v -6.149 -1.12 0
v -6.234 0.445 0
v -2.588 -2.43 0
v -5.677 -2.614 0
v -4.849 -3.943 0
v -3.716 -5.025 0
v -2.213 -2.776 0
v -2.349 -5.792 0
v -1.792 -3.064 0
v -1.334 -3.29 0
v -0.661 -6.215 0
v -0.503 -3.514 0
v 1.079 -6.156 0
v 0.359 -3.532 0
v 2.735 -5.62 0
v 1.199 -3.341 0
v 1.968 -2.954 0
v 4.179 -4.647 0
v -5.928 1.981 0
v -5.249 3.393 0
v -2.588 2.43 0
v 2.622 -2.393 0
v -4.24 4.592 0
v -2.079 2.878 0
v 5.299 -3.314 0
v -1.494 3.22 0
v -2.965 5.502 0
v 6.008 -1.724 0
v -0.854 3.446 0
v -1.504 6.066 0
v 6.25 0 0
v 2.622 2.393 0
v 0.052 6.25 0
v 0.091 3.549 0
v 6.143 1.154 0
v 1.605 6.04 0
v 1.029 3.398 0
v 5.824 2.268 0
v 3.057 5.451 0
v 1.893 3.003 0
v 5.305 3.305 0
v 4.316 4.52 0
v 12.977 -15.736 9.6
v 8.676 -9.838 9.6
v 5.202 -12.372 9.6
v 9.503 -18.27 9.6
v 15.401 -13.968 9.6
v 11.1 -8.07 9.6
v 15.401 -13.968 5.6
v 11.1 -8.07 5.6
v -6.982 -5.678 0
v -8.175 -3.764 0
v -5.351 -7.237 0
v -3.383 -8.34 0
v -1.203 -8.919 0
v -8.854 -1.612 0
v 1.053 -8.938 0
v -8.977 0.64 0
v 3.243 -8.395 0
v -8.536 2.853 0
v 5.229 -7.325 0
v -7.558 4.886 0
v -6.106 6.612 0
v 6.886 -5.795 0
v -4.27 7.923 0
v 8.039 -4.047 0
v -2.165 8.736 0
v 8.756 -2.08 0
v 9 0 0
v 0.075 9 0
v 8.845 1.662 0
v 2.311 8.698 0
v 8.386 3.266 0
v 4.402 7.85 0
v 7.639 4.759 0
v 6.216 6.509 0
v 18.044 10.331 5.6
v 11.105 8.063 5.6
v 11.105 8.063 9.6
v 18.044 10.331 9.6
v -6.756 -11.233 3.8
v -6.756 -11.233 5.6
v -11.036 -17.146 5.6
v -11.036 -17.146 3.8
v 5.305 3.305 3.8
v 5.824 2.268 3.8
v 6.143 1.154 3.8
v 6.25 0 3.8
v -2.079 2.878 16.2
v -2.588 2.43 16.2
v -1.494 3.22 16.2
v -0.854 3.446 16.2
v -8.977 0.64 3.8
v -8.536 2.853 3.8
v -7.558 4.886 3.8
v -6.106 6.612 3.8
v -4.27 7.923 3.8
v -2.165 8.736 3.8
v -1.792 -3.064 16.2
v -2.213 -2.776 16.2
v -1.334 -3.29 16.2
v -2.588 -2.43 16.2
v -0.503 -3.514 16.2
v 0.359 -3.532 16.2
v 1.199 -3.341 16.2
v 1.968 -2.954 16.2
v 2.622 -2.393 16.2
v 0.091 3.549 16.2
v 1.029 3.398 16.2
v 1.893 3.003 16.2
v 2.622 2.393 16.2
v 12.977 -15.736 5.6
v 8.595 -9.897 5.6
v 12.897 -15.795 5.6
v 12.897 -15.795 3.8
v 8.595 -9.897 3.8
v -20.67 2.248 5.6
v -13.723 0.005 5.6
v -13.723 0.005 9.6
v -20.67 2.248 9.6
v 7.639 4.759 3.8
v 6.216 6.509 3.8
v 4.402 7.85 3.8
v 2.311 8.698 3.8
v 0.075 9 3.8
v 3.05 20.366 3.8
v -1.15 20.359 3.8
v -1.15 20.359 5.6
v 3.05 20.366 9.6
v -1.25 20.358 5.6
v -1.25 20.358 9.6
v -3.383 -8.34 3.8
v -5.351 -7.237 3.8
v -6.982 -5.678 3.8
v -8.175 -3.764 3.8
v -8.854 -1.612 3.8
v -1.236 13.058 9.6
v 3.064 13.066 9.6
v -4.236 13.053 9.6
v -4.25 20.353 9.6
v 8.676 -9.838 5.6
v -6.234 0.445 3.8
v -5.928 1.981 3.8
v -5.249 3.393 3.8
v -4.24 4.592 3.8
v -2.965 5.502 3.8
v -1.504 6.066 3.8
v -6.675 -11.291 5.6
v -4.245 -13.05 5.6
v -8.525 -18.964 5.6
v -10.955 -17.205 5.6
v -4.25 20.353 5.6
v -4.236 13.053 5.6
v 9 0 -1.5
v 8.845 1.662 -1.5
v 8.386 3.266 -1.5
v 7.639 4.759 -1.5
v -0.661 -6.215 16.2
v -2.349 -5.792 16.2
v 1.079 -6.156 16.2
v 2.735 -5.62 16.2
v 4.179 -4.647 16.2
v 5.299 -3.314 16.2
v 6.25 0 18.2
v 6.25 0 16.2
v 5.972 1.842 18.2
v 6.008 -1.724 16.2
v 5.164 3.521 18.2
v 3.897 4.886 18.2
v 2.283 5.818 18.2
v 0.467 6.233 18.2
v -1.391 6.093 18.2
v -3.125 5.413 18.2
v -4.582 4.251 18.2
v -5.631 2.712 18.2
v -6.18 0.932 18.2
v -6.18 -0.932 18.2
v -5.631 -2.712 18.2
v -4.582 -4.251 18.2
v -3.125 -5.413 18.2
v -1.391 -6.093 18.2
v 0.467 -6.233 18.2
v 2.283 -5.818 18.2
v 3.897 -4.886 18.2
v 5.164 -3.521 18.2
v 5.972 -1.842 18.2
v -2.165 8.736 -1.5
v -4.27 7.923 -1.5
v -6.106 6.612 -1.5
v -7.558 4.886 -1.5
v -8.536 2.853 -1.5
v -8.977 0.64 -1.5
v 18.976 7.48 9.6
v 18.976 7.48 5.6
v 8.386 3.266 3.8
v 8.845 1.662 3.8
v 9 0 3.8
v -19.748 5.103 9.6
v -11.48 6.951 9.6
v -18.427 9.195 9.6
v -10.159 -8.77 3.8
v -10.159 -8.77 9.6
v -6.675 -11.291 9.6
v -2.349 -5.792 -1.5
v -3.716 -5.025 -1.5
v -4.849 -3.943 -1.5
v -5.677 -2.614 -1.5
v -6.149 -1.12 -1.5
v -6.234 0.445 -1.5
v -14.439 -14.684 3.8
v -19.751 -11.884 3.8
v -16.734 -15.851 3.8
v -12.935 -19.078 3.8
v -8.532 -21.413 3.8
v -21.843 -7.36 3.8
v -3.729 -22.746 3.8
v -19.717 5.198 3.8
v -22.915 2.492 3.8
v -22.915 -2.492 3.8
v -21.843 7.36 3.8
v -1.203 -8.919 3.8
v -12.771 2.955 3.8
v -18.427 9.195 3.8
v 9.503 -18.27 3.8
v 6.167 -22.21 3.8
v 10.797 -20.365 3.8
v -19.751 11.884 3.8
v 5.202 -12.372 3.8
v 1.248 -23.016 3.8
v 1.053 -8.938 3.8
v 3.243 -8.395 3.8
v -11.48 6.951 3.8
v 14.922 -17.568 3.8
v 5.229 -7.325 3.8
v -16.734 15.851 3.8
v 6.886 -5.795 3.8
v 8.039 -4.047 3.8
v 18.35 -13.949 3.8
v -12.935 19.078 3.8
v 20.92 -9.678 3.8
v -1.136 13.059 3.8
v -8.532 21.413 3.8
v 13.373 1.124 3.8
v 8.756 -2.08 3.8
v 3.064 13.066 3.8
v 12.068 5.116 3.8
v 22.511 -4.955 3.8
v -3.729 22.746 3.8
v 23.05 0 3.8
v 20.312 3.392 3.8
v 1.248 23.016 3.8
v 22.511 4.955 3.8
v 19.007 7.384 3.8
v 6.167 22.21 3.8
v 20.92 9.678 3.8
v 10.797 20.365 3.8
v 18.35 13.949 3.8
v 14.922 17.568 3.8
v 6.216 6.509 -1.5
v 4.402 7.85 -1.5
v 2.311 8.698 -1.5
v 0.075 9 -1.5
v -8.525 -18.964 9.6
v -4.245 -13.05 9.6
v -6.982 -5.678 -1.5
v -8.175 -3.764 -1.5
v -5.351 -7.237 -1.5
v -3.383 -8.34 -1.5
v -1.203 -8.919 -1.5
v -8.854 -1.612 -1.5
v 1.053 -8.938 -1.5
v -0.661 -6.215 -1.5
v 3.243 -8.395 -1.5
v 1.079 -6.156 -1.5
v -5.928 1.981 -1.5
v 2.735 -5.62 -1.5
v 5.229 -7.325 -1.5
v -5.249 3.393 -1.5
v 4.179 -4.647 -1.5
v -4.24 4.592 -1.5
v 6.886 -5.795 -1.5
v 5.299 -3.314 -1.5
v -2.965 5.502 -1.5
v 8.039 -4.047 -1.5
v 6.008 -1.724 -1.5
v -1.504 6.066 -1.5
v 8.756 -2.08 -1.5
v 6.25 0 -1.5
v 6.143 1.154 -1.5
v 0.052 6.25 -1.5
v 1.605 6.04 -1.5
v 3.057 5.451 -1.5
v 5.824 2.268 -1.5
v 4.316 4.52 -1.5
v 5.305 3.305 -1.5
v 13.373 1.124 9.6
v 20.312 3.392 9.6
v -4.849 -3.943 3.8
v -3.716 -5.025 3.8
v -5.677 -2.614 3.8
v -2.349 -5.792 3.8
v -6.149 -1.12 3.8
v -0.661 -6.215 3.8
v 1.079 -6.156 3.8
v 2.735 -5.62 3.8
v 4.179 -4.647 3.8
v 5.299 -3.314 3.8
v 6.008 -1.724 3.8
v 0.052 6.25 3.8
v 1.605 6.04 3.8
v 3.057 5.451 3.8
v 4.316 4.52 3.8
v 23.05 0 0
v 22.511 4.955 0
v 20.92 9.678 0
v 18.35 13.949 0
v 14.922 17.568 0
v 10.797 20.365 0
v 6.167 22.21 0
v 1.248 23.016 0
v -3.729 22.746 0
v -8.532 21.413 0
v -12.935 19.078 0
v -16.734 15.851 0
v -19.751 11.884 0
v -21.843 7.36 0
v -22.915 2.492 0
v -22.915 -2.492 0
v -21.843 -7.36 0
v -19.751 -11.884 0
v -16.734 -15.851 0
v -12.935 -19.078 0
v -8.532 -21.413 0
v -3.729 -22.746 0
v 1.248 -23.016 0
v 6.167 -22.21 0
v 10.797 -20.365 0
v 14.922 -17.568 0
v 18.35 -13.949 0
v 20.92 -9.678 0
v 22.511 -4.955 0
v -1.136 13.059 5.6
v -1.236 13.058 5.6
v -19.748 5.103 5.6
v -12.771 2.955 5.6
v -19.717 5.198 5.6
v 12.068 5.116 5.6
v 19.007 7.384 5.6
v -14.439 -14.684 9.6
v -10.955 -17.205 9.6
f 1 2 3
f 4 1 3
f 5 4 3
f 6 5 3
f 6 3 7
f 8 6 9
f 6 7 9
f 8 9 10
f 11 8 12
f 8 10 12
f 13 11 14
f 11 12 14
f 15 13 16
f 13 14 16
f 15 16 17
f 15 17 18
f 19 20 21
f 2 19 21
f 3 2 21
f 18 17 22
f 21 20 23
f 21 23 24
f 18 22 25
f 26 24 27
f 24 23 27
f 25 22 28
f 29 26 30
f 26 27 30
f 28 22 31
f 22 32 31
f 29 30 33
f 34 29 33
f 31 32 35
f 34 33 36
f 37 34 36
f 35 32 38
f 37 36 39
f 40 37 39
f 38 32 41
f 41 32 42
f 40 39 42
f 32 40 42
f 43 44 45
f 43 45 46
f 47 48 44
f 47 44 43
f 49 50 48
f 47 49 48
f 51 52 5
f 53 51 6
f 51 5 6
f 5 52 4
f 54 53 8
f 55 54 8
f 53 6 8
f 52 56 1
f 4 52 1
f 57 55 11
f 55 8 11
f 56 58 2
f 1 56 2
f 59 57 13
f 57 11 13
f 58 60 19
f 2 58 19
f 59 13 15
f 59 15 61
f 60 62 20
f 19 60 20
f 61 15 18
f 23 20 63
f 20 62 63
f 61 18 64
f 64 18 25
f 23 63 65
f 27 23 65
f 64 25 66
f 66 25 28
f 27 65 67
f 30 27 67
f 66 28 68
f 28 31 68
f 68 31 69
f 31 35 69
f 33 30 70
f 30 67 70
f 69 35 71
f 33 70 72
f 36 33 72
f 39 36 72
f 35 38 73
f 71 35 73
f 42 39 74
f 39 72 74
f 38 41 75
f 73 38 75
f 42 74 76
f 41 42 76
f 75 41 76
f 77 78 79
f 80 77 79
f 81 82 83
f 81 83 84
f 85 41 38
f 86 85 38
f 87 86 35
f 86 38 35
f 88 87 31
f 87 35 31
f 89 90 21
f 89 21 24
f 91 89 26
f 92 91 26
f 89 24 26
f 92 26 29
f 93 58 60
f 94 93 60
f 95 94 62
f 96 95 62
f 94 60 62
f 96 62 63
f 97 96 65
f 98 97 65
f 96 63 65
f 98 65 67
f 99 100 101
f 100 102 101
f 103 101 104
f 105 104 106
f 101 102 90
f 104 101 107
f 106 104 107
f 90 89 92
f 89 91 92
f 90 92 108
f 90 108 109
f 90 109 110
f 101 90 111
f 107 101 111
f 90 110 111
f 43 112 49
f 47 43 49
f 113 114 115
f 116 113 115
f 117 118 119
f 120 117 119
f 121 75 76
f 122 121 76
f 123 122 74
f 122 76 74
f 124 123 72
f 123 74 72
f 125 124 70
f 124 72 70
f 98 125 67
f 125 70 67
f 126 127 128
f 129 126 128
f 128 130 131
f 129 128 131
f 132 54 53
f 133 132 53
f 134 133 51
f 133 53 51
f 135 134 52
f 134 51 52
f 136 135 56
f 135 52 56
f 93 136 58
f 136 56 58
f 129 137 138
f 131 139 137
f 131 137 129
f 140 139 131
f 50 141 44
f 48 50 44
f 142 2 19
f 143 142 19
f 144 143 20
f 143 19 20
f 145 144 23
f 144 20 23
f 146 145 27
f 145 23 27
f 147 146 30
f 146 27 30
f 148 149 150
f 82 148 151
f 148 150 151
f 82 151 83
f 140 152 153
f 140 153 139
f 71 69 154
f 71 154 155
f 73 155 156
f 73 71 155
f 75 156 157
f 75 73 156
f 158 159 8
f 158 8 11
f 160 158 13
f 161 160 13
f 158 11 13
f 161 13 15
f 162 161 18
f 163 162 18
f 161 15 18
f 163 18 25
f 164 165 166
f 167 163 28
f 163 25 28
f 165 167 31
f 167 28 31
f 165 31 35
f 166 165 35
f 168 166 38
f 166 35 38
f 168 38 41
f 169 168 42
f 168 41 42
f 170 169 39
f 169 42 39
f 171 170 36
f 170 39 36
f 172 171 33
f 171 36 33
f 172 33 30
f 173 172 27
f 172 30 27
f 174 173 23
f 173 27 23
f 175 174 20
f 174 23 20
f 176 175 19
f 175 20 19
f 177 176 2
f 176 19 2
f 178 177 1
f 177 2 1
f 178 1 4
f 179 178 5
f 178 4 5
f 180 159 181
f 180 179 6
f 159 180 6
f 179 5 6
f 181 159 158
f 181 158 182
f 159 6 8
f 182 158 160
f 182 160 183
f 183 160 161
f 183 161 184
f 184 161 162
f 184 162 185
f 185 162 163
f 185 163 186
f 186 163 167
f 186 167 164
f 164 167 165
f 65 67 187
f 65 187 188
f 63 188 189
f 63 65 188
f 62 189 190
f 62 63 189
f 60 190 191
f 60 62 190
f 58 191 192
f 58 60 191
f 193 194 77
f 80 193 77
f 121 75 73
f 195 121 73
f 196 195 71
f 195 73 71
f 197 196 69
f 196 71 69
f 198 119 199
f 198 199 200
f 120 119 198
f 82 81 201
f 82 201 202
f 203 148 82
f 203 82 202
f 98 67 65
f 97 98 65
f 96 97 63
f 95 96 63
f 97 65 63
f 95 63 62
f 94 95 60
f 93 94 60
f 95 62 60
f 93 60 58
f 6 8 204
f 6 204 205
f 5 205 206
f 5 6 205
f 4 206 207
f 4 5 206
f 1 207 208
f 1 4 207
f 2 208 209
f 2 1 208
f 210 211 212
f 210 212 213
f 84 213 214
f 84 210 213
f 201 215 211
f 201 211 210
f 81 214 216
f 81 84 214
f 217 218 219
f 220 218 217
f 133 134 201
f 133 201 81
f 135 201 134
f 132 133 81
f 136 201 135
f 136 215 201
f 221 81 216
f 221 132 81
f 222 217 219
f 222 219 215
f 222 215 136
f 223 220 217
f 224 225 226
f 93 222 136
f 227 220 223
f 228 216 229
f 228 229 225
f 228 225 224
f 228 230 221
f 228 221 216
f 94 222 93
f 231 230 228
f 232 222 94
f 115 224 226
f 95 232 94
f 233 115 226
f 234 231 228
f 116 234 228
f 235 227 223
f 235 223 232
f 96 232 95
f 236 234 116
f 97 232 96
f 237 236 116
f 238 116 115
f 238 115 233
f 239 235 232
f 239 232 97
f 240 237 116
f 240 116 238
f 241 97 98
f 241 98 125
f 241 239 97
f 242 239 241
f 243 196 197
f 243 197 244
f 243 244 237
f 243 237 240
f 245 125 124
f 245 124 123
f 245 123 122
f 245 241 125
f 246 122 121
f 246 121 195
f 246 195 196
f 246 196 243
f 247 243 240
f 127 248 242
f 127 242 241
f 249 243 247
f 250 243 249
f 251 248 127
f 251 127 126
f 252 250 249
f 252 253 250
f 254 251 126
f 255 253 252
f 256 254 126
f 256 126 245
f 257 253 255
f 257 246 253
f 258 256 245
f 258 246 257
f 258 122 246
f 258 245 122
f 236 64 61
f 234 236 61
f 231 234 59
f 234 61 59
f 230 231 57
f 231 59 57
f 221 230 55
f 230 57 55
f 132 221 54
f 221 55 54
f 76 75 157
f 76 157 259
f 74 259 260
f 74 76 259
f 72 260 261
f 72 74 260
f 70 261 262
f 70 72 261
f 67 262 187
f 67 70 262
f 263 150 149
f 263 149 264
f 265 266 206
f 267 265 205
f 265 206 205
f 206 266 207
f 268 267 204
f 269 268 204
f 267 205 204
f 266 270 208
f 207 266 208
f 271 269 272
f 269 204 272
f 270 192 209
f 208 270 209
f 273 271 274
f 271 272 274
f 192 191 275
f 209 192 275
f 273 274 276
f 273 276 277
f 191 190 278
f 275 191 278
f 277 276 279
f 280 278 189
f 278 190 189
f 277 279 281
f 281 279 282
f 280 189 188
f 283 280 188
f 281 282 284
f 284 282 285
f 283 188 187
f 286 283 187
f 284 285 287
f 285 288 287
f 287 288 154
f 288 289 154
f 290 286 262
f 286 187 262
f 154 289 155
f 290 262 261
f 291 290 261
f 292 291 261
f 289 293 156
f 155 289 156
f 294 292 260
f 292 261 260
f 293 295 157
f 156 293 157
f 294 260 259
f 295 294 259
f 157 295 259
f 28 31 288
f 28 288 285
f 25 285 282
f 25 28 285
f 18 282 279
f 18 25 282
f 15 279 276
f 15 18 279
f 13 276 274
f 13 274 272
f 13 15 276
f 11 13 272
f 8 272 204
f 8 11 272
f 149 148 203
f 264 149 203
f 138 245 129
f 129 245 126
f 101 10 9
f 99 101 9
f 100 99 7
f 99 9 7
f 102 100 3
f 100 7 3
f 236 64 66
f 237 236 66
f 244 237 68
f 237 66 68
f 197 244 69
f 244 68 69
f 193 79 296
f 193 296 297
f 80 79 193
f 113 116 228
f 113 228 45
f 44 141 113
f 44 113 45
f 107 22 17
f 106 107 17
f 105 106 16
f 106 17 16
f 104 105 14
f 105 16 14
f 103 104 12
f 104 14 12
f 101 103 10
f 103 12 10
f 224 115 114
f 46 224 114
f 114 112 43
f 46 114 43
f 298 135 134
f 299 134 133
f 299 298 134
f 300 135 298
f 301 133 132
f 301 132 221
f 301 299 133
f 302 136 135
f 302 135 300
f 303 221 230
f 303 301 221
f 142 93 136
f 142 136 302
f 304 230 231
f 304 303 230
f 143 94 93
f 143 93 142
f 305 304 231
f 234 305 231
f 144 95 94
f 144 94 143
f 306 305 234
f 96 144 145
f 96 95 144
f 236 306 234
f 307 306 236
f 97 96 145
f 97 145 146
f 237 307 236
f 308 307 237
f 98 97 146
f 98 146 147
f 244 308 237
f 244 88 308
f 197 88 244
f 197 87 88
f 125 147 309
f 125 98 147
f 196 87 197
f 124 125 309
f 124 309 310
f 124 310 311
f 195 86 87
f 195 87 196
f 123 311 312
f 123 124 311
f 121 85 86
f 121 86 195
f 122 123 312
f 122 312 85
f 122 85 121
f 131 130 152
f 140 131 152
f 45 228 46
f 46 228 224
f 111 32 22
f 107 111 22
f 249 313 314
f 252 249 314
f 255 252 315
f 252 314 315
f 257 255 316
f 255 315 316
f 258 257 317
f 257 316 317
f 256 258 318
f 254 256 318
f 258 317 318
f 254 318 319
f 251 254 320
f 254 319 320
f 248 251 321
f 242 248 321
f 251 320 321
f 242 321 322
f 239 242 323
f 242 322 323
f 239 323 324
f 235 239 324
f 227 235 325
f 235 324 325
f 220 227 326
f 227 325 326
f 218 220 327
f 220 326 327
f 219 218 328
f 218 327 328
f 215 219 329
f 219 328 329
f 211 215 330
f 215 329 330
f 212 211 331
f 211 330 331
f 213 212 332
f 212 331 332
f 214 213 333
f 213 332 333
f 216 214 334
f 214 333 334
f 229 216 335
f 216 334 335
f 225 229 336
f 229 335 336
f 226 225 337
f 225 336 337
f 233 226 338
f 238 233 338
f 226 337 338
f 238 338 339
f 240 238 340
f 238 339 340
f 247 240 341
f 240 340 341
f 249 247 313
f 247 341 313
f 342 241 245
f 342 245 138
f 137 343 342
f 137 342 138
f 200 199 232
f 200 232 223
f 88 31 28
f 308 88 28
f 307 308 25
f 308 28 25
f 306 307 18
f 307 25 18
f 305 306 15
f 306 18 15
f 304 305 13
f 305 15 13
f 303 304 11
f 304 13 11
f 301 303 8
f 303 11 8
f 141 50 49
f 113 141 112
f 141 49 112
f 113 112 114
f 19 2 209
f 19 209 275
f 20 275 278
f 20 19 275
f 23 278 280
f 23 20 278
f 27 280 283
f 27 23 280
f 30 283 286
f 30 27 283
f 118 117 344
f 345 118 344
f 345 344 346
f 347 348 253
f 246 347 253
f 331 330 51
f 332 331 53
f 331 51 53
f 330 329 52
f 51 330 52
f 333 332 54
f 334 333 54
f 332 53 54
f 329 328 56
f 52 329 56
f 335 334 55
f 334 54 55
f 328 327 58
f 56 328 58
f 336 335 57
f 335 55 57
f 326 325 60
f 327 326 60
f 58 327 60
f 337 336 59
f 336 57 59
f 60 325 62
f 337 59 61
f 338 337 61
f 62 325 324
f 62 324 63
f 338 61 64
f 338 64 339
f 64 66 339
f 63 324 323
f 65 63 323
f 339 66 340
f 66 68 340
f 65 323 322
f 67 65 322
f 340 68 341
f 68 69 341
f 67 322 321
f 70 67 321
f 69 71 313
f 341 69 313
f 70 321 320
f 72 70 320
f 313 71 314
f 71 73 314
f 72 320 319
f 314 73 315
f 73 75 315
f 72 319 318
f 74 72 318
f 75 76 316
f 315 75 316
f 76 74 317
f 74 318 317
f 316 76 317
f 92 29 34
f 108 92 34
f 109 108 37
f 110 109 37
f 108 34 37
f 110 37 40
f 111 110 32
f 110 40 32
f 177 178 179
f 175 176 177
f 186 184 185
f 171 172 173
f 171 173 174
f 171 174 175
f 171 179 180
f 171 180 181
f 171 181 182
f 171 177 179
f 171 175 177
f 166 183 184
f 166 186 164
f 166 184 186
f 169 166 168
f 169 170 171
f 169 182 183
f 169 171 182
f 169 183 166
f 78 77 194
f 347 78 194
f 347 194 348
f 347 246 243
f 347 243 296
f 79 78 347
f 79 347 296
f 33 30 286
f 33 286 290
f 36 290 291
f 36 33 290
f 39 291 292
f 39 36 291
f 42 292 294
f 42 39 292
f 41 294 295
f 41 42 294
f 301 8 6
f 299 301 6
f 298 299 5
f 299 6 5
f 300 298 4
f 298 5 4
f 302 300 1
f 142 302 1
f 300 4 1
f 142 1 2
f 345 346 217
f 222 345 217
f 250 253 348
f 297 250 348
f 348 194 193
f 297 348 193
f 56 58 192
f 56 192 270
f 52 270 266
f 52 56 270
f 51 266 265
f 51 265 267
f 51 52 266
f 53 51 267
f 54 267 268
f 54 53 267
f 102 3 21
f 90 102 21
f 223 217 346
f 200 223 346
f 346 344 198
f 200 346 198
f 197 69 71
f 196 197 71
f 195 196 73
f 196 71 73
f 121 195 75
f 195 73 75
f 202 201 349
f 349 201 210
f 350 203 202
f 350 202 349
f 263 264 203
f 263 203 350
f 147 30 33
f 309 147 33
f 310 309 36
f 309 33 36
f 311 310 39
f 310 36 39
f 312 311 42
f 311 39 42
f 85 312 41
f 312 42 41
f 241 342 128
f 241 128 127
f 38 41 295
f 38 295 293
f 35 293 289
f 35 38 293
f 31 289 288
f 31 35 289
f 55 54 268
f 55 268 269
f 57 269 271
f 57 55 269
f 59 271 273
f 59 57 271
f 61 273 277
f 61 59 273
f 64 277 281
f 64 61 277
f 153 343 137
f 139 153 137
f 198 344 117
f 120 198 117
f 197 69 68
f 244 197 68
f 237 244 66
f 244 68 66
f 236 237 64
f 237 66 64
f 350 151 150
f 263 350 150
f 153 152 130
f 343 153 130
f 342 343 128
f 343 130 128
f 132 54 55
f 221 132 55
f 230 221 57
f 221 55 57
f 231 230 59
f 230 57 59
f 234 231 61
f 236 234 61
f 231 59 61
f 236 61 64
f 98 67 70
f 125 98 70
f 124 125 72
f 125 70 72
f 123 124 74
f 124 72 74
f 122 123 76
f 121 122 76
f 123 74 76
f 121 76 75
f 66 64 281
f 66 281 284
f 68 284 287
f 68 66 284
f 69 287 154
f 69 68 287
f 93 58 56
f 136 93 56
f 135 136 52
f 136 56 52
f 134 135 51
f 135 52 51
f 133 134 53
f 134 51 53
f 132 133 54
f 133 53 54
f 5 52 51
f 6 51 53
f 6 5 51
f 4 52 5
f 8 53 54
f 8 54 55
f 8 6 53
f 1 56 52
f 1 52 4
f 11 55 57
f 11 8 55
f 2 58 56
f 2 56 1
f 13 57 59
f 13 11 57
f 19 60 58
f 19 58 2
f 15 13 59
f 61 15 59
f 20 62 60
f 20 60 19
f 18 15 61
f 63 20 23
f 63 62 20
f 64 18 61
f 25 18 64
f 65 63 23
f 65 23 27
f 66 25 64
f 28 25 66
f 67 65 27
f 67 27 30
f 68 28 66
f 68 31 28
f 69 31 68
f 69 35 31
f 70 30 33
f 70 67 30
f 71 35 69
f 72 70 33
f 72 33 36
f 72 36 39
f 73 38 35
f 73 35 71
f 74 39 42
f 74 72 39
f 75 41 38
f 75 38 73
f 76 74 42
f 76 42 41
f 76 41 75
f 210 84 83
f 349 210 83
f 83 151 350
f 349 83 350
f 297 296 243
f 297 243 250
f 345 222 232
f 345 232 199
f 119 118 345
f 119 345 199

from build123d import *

# Parameters (mm, degrees)
F1_DEPTH  = 16.2
F0_R      = 23.05
F2_DEPTH  = 3.8
F3_DEPTH  = 1.5
F4_DEPTH  = 3.8
F5_R      = 6.25
F6_DEPTH  = 2
F7_DEPTH  = 9.6
F8_W      = 1.6
F8_H      = 5.8
F9_DEPTH  = 5.4
F8_W_2    = 7.3
F10_DEPTH = 4.3
F12_DEPTH = 7.3
F11_W     = 2.4
F11_H     = 4
F13_DEPTH = 7.3
F14_W     = 1.6
F14_H     = 5.8
F15_DEPTH = 5.4
F16_DEPTH = 4.3
F17_W     = 2.4
F17_H     = 4
F18_DEPTH = 7.3
F19_W     = 1.6
F19_H     = 5.8
F20_DEPTH = 5.4
F19_W_2   = 7.3
F21_DEPTH = 4.3
F22_W     = 2.4
F22_H     = 4
F23_DEPTH = 7.3
F24_W     = 1.6
F24_H     = 5.8
F25_DEPTH = 5.4
F26_DEPTH = 4.3
F27_W     = 2.4
F27_H     = 4
F28_DEPTH = 7.3
F29_W     = 1.6
F29_H     = 5.8
F30_DEPTH = 5.4
F31_DEPTH = 4.3
F32_W     = 2.4
F32_H     = 4
F33_DEPTH = 7.3


with BuildPart() as f1:
    # F0 (on Top) → F1 (new body)
    with BuildSketch(Plane.XY):
        with BuildLine():
            Line((2.62206635, 1.633340396), (5.3049401224, 3.3045590171))
            ThreePointArc((5.3049401224, 3.3045590171), (2.3494156576, 5.791609972), (-1.5035057347, 6.0664627672))
            Line((-1.5035057347, 6.0664627672), (-0.8539912573, 3.4457508518))
            ThreePointArc((-0.8539912573, 3.4457508518), (1.0288359447, 3.3976457436), (2.62206635, 2.3931711297))
            Line((2.62206635, 2.3931711297), (2.62206635, 1.633340396))
        make_face()
        with BuildLine():
            Line((-0.8539912573, 3.4457508518), (-1.5035057347, 6.0664627672))
            ThreePointArc((-1.5035057347, 6.0664627672), (-4.7821390387, 4.0241329768), (-6.2341577688, 0.4447211645))
            Line((-6.2341577688, 0.4447211645), (-2.5880055924, 0.1846185008))
            Line((-2.5880055924, 0.1846185008), (-2.5880055924, 2.4299644141))
            ThreePointArc((-2.5880055924, 2.4299644141), (-1.7943776359, 3.0631207779), (-0.8539912573, 3.4457508518))
        make_face()
        with BuildLine():
            ThreePointArc((-6.2341577688, 0.4447211645), (-5.3049401224, -3.3045590171), (-2.3494156576, -5.791609972))
            Line((-2.3494156576, -5.791609972), (-1.3344680935, -3.2896344641))
            ThreePointArc((-1.3344680935, -3.2896344641), (-2.0077868669, -2.9276768772), (-2.5880055924, -2.4299644141))
            Line((-2.5880055924, -2.4299644141), (-2.5880055924, 0.1846185008))
            Line((-2.5880055924, 0.1846185008), (-6.2341577688, 0.4447211645))
        make_face()
        with BuildLine():
            ThreePointArc((-2.3494156576, -5.791609972), (1.5035057347, -6.0664627672), (4.7821390387, -4.0241329768))
            Line((4.7821390387, -4.0241329768), (2.62206635, -2.206448533))
            Line((2.62206635, -2.206448533), (2.62206635, -2.3931711297))
            ThreePointArc((2.62206635, -2.3931711297), (0.7844673002, -3.4622407564), (-1.3344680935, -3.2896344641))
            Line((-1.3344680935, -3.2896344641), (-2.3494156576, -5.791609972))
        make_face()
        with BuildLine():
            ThreePointArc((4.7821390387, -4.0241329768), (5.8715785353, -2.1417435664), (6.25, 0))
            ThreePointArc((6.25, 0), (6.0090921014, 1.7185203279), (5.3049401224, 3.3045590171))
            Line((5.3049401224, 3.3045590171), (2.62206635, 1.633340396))
            Line((2.62206635, 1.633340396), (2.62206635, -2.206448533))
            Line((2.62206635, -2.206448533), (4.7821390387, -4.0241329768))
        make_face()
    extrude(amount=F1_DEPTH)

    # F5 (on face) → F6 (join)
    with BuildSketch(Plane.XY.offset(16.2)):
        Circle(F5_R)
        with BuildLine():
            ThreePointArc((2.62206635, -2.3931711297), (0.0250693088, -3.549911482), (-2.5880055924, -2.4299644141))
            Line((-2.5880055924, -2.4299644141), (-2.5880055924, 2.4299644141))
            ThreePointArc((-2.5880055924, 2.4299644141), (0.0250693088, 3.549911482), (2.62206635, 2.3931711297))
            Line((2.62206635, 2.3931711297), (2.62206635, -2.3931711297))
        make_face(mode=Mode.SUBTRACT)
        with BuildLine():
            Line((-2.5880055924, 2.4299644141), (-2.5880055924, -2.4299644141))
            ThreePointArc((-2.5880055924, -2.4299644141), (0.0250693088, -3.549911482), (2.62206635, -2.3931711297))
            Line((2.62206635, -2.3931711297), (2.62206635, 2.3931711297))
            ThreePointArc((2.62206635, 2.3931711297), (0.0250693088, 3.549911482), (-2.5880055924, 2.4299644141))
        make_face()
    extrude(amount=F6_DEPTH)


with BuildPart() as f2:
    # F0 (on Top) → F2 (new body)
    with BuildSketch(Plane.XY):
        Circle(F0_R)
        Polygon((-5.7372268782, -9.9950321736), (-4.436474094, -10.9364758511), (-1.3627715174, -13.161124449), (-6.5809606379, -20.370874951), (-10.9554159987, -17.2047826756), align=None, mode=Mode.SUBTRACT)
        Polygon((7.7329398733, -8.5450618089), (9.0302607334, -7.5988944931), (12.0958536107, -5.3630838516), (17.3402246884, -12.5538120484), (12.977310951, -15.7357900056), align=None, mode=Mode.SUBTRACT)
        Polygon((-11.2787410852, 2.367792207), (-11.7721525137, 0.8397806999), (-12.9380927273, -2.770938388), (-21.4074820413, -0.036081052), (-19.7481303992, 5.102649543), align=None, mode=Mode.SUBTRACT)
        Polygon((-1.2334184628, 11.4584082358), (-2.8391162802, 11.4554888668), (-6.6334095377, 11.4485903445), (-6.6495908771, 20.3485756346), (-1.2495998022, 20.3583935259), align=None, mode=Mode.SUBTRACT)
        with BuildLine():
            ThreePointArc((-2.165048258, 8.7357063847), (3.3831585469, 8.3399183597), (7.6391137763, 4.7585649846))
            ThreePointArc((7.6391137763, 4.7585649846), (8.6530926259, 2.4746692722), (9, 0))
            ThreePointArc((9, 0), (8.4550730908, -3.0841107356), (6.8862802157, -5.7947514866))
            ThreePointArc((6.8862802157, -5.7947514866), (2.165048258, -8.7357063847), (-3.3831585469, -8.3399183597))
            ThreePointArc((-3.3831585469, -8.3399183597), (-7.6391137763, -4.7585649846), (-8.977187187, 0.6403984769))
            ThreePointArc((-8.977187187, 0.6403984769), (-6.8862802157, 5.7947514866), (-2.165048258, 8.7357063847))
        make_face(mode=Mode.SUBTRACT)
        Polygon((10.5164465528, 4.7138935397), (10.0174821545, 6.2401007775), (8.8384201717, 9.8465563442), (17.2978088679, 12.6121924168), (18.9758352491, 7.4795296123), align=None, mode=Mode.SUBTRACT)
    extrude(amount=F2_DEPTH)

    # F0 (on Top) → F7 (join)
    with BuildSketch(Plane.XY):
        Polygon((-21.4074820413, -0.036081052), (-12.9380927273, -2.770938388), (-16.3431115632, 1.1658555775), align=None)
        Polygon((-12.9380927273, -2.770938388), (-11.7721525137, 0.8397806999), (-16.3431115632, 1.1658555775), align=None)
        Polygon((-21.4074820413, -0.036081052), (-16.3431115632, 1.1658555775), (-19.7481303992, 5.102649543), align=None)
        Polygon((-16.3431115632, 1.1658555775), (-11.2787410852, 2.367792207), (-19.7481303992, 5.102649543), align=None)
        Polygon((-16.3431115632, 1.1658555775), (-11.7721525137, 0.8397806999), (-11.2787410852, 2.367792207), align=None)
        Polygon((-6.5809606379, -20.370874951), (-6.1590937581, -15.1829535623), (-10.9554159987, -17.2047826756), align=None)
        Polygon((-6.1590937581, -15.1829535623), (-5.7372268782, -9.9950321736), (-10.9554159987, -17.2047826756), align=None)
        Polygon((-6.5809606379, -20.370874951), (-1.3627715174, -13.161124449), (-6.1590937581, -15.1829535623), align=None)
        Polygon((-1.3627715174, -13.161124449), (-4.436474094, -10.9364758511), (-6.1590937581, -15.1829535623), align=None)
        Polygon((-6.1590937581, -15.1829535623), (-4.436474094, -10.9364758511), (-5.7372268782, -9.9950321736), align=None)
        Polygon((12.5365822809, -10.5494369286), (7.7329398733, -8.5450618089), (12.977310951, -15.7357900056), align=None)
        Polygon((17.3402246884, -12.5538120484), (12.5365822809, -10.5494369286), (12.977310951, -15.7357900056), align=None)
        Polygon((17.3402246884, -12.5538120484), (12.0958536107, -5.3630838516), (12.5365822809, -10.5494369286), align=None)
        Polygon((12.0958536107, -5.3630838516), (9.0302607334, -7.5988944931), (12.5365822809, -10.5494369286), align=None)
        Polygon((12.5365822809, -10.5494369286), (9.0302607334, -7.5988944931), (7.7329398733, -8.5450618089), align=None)
        Polygon((13.9071277104, 8.6630429782), (10.5164465528, 4.7138935397), (18.9758352491, 7.4795296123), align=None)
        Polygon((13.9071277104, 8.6630429782), (10.0174821545, 6.2401007775), (10.5164465528, 4.7138935397), align=None)
        Polygon((8.8384201717, 9.8465563442), (10.0174821545, 6.2401007775), (13.9071277104, 8.6630429782), align=None)
        Polygon((17.2978088679, 12.6121924168), (8.8384201717, 9.8465563442), (13.9071277104, 8.6630429782), align=None)
        Polygon((17.2978088679, 12.6121924168), (13.9071277104, 8.6630429782), (18.9758352491, 7.4795296123), align=None)
        Polygon((-6.6334095377, 11.4485903445), (-2.8391162802, 11.4554888668), (-3.94150467, 15.9034919352), align=None)
        Polygon((-3.94150467, 15.9034919352), (-2.8391162802, 11.4554888668), (-1.2334184628, 11.4584082358), align=None)
        Polygon((-3.94150467, 15.9034919352), (-1.2334184628, 11.4584082358), (-1.2495998022, 20.3583935259), align=None)
        Polygon((-6.6495908771, 20.3485756346), (-3.94150467, 15.9034919352), (-1.2495998022, 20.3583935259), align=None)
        Polygon((-6.6495908771, 20.3485756346), (-6.6334095377, 11.4485903445), (-3.94150467, 15.9034919352), align=None)
    extrude(amount=F7_DEPTH)

    # F8 (on face) → F9 (cut)
    with BuildSketch(Plane(origin=(-0.3726115815, -1.1539148696, 0), x_dir=(-0.9516167768, 0.3072873411, 0), z_dir=(0.3072873411, 0.9516167768, 0))):
        with Locations((12.2606318101, 6.7)):
            Rectangle(F8_W, F8_H)
    extrude(amount=-F9_DEPTH, mode=Mode.SUBTRACT)

    # F8 (on face) → F10 (join)
    with BuildSketch(Plane(origin=(-0.3726115815, -1.1539148696, 0), x_dir=(-0.9516167768, 0.3072873411, 0), z_dir=(0.3072873411, 0.9516167768, 0))):
        with Locations((16.7106318101, 6.7)):
            Rectangle(F8_W_2, F8_H)
    extrude(amount=F10_DEPTH)

    # F11 (on face) → F12 (cut)
    with BuildSketch(Plane(origin=(-19.3755188177, 6.2565644126, 0), x_dir=(-0.3072873411, -0.9516167768, 0), z_dir=(-0.9516167768, 0.3072873411, 0))):
        Polygon((1.1125835711, 3.8), (6.6125835711, 3.8), (6.6125835711, 5.6), (4.2125835711, 5.6), (1.1125835711, 5.6), align=None)
    extrude(amount=-F12_DEPTH, mode=Mode.SUBTRACT)

    # F11 (on face) → F13 (cut)
    with BuildSketch(Plane(origin=(-19.3755188177, 6.2565644126, 0), x_dir=(-0.3072873411, -0.9516167768, 0), z_dir=(-0.9516167768, 0.3072873411, 0))):
        with Locations((5.4125835711, 7.6)):
            Rectangle(F11_W, F11_H)
    extrude(amount=-F13_DEPTH, mode=Mode.SUBTRACT)

    # F14 (on face) → F15 (cut)
    with BuildSketch(Plane(origin=(-1.2125815669, -0.0022046322, 0), x_dir=(-0.001818128, 0.9999983472, 0), z_dir=(0.9999983472, 0.001818128, 0))):
        with Locations((12.2606318101, 6.7)):
            Rectangle(F14_W, F14_H)
    extrude(amount=-F15_DEPTH, mode=Mode.SUBTRACT)

    # F16 (add): a face of the model
    f16_faces = [f2.faces().sort_by_distance(p)[0] for p in [
        (-1.2429636349, 16.7083995586, 6.7),
    ]]
    extrude(f16_faces, amount=F16_DEPTH)

    # F17 (on face) → F18 (cut)
    with BuildSketch(Plane(origin=(-0.0370182353, 20.3605981581, 0), x_dir=(-0.9999983472, -0.001818128, 0), z_dir=(-0.001818128, 0.9999983472, 0))):
        Polygon((1.1125835711, 3.8), (6.6125835711, 3.8), (6.6125835711, 5.6), (4.2125835711, 5.6), (1.1125835711, 5.6), align=None)
        with Locations((5.4125835711, 7.6)):
            Rectangle(F17_W, F17_H)
    extrude(amount=-F18_DEPTH, mode=Mode.SUBTRACT)

    # F19 (on face) → F20 (cut)
    with BuildSketch(Plane(origin=(-0.376805041, 1.152552332, 0), x_dir=(0.9504931119, 0.3107456261, 0), z_dir=(0.3107456261, -0.9504931119, 0))):
        with Locations((12.2606318101, 6.7)):
            Rectangle(F19_W, F19_H)
    extrude(amount=-F20_DEPTH, mode=Mode.SUBTRACT)

    # F19 (on face) → F21 (join)
    with BuildSketch(Plane(origin=(-0.376805041, 1.152552332, 0), x_dir=(0.9504931119, 0.3107456261, 0), z_dir=(0.3107456261, -0.9504931119, 0))):
        with Locations((16.7106318101, 6.7)):
            Rectangle(F19_W_2, F19_H)
    extrude(amount=F21_DEPTH)

    # F22 (on face) → F23 (cut)
    with BuildSketch(Plane(origin=(19.3526402901, 6.3269772804, 0), x_dir=(-0.3107456261, 0.9504931119, 0), z_dir=(0.9504931119, 0.3107456261, 0))):
        with Locations((5.4125835711, 7.6)):
            Rectangle(F22_W, F22_H)
        Polygon((1.1125835711, 3.8), (6.6125835711, 3.8), (6.6125835711, 5.6), (4.2125835711, 5.6), (1.1125835711, 5.6), align=None)
    extrude(amount=-F23_DEPTH, mode=Mode.SUBTRACT)

    # F24 (on face) → F25 (cut)
    with BuildSketch(Plane(origin=(0.9797032444, 0.7145211471, 0), x_dir=(0.5892551773, -0.8079469884, 0), z_dir=(-0.8079469884, -0.5892551773, 0))):
        with Locations((12.2606318101, 6.7)):
            Rectangle(F24_W, F24_H)
    extrude(amount=-F25_DEPTH, mode=Mode.SUBTRACT)

    # F26 (add): a face of the model
    f26_faces = [f2.faces().sort_by_distance(p)[0] for p in [
        (10.826529554, -12.786783498, 6.7),
    ]]
    extrude(f26_faces, amount=F26_DEPTH)

    # F27 (on face) → F28 (cut)
    with BuildSketch(Plane(origin=(11.9976077066, -16.4503111528, 0), x_dir=(0.8079469884, 0.5892551773, 0), z_dir=(0.5892551773, -0.8079469884, 0))):
        with Locations((5.4125835711, 7.6)):
            Rectangle(F27_W, F27_H)
        Polygon((1.1125835711, 3.8), (6.6125835711, 3.8), (6.6125835711, 5.6), (4.2125835711, 5.6), (1.1125835711, 5.6), align=None)
    extrude(amount=-F28_DEPTH, mode=Mode.SUBTRACT)

    # F29 (on face) → F30 (cut)
    with BuildSketch(Plane(origin=(0.982294945, -0.7109539774, 0), x_dir=(-0.5863133843, -0.8100843261, 0), z_dir=(-0.8100843261, 0.5863133843, 0))):
        with Locations((12.2606318101, 6.7)):
            Rectangle(F29_W, F29_H)
    extrude(amount=-F30_DEPTH, mode=Mode.SUBTRACT)

    # F31 (add): a face of the model
    f31_faces = [f2.faces().sort_by_distance(p)[0] for p in [
        (-8.8153721459, -14.2479748855, 6.7),
    ]]
    extrude(f31_faces, amount=F31_DEPTH)

    # F32 (on face) → F33 (cut)
    with BuildSketch(Plane(origin=(-11.9377109437, -16.4938286983, 0), x_dir=(0.8100843261, -0.5863133843, 0), z_dir=(-0.5863133843, -0.8100843261, 0))):
        with Locations((5.4125835711, 7.6)):
            Rectangle(F32_W, F32_H)
        Polygon((1.1125835711, 3.8), (6.6125835711, 3.8), (6.6125835711, 5.6), (4.2125835711, 5.6), (1.1125835711, 5.6), align=None)
    extrude(amount=-F33_DEPTH, mode=Mode.SUBTRACT)


with BuildPart() as f3:
    # F0 (on Top) → F3 (new body)
    with BuildSketch(Plane.XY):
        with BuildLine():
            ThreePointArc((-1.5035057347, 6.0664627672), (2.3494156576, 5.791609972), (5.3049401224, 3.3045590171))
            Line((5.3049401224, 3.3045590171), (7.6391137763, 4.7585649846))
            ThreePointArc((7.6391137763, 4.7585649846), (3.3831585469, 8.3399183597), (-2.165048258, 8.7357063847))
            Line((-2.165048258, 8.7357063847), (-1.5035057347, 6.0664627672))
        make_face()
        with BuildLine():
            ThreePointArc((-6.2341577688, 0.4447211645), (-4.7821390387, 4.0241329768), (-1.5035057347, 6.0664627672))
            Line((-1.5035057347, 6.0664627672), (-2.165048258, 8.7357063847))
            ThreePointArc((-2.165048258, 8.7357063847), (-6.8862802157, 5.7947514866), (-8.977187187, 0.6403984769))
            Line((-8.977187187, 0.6403984769), (-6.2341577688, 0.4447211645))
        make_face()
        with BuildLine():
            Line((-3.3831585469, -8.3399183597), (-2.3494156576, -5.791609972))
            ThreePointArc((-2.3494156576, -5.791609972), (-5.3049401224, -3.3045590171), (-6.2341577688, 0.4447211645))
            Line((-6.2341577688, 0.4447211645), (-8.977187187, 0.6403984769))
            ThreePointArc((-8.977187187, 0.6403984769), (-7.6391137763, -4.7585649846), (-3.3831585469, -8.3399183597))
        make_face()
        with BuildLine():
            Line((6.8862802157, -5.7947514866), (4.7821390387, -4.0241329768))
            ThreePointArc((4.7821390387, -4.0241329768), (1.5035057347, -6.0664627672), (-2.3494156576, -5.791609972))
            Line((-2.3494156576, -5.791609972), (-3.3831585469, -8.3399183597))
            ThreePointArc((-3.3831585469, -8.3399183597), (2.165048258, -8.7357063847), (6.8862802157, -5.7947514866))
        make_face()
        with BuildLine():
            ThreePointArc((5.3049401224, 3.3045590171), (6.0090921014, 1.7185203279), (6.25, 0))
            ThreePointArc((6.25, 0), (5.8715785353, -2.1417435664), (4.7821390387, -4.0241329768))
            Line((4.7821390387, -4.0241329768), (6.8862802157, -5.7947514866))
            ThreePointArc((6.8862802157, -5.7947514866), (8.4550730908, -3.0841107356), (9, 0))
            ThreePointArc((9, 0), (8.6530926259, 2.4746692722), (7.6391137763, 4.7585649846))
            Line((7.6391137763, 4.7585649846), (5.3049401224, 3.3045590171))
        make_face()
    extrude(amount=-F3_DEPTH)


with BuildPart() as f4:
    # F0 (on Top) → F4 (new body)
    with BuildSketch(Plane.XY):
        with BuildLine():
            ThreePointArc((-1.5035057347, 6.0664627672), (2.3494156576, 5.791609972), (5.3049401224, 3.3045590171))
            Line((5.3049401224, 3.3045590171), (7.6391137763, 4.7585649846))
            ThreePointArc((7.6391137763, 4.7585649846), (3.3831585469, 8.3399183597), (-2.165048258, 8.7357063847))
            Line((-2.165048258, 8.7357063847), (-1.5035057347, 6.0664627672))
        make_face()
        with BuildLine():
            ThreePointArc((-6.2341577688, 0.4447211645), (-4.7821390387, 4.0241329768), (-1.5035057347, 6.0664627672))
            Line((-1.5035057347, 6.0664627672), (-2.165048258, 8.7357063847))
            ThreePointArc((-2.165048258, 8.7357063847), (-6.8862802157, 5.7947514866), (-8.977187187, 0.6403984769))
            Line((-8.977187187, 0.6403984769), (-6.2341577688, 0.4447211645))
        make_face()
        with BuildLine():
            Line((-3.3831585469, -8.3399183597), (-2.3494156576, -5.791609972))
            ThreePointArc((-2.3494156576, -5.791609972), (-5.3049401224, -3.3045590171), (-6.2341577688, 0.4447211645))
            Line((-6.2341577688, 0.4447211645), (-8.977187187, 0.6403984769))
            ThreePointArc((-8.977187187, 0.6403984769), (-7.6391137763, -4.7585649846), (-3.3831585469, -8.3399183597))
        make_face()
        with BuildLine():
            Line((6.8862802157, -5.7947514866), (4.7821390387, -4.0241329768))
            ThreePointArc((4.7821390387, -4.0241329768), (1.5035057347, -6.0664627672), (-2.3494156576, -5.791609972))
            Line((-2.3494156576, -5.791609972), (-3.3831585469, -8.3399183597))
            ThreePointArc((-3.3831585469, -8.3399183597), (2.165048258, -8.7357063847), (6.8862802157, -5.7947514866))
        make_face()
        with BuildLine():
            ThreePointArc((5.3049401224, 3.3045590171), (6.0090921014, 1.7185203279), (6.25, 0))
            ThreePointArc((6.25, 0), (5.8715785353, -2.1417435664), (4.7821390387, -4.0241329768))
            Line((4.7821390387, -4.0241329768), (6.8862802157, -5.7947514866))
            ThreePointArc((6.8862802157, -5.7947514866), (8.4550730908, -3.0841107356), (9, 0))
            ThreePointArc((9, 0), (8.6530926259, 2.4746692722), (7.6391137763, 4.7585649846))
            Line((7.6391137763, 4.7585649846), (5.3049401224, 3.3045590171))
        make_face()
    extrude(amount=F4_DEPTH)


solid = Compound([f1.part, f2.part, f3.part, f4.part])
